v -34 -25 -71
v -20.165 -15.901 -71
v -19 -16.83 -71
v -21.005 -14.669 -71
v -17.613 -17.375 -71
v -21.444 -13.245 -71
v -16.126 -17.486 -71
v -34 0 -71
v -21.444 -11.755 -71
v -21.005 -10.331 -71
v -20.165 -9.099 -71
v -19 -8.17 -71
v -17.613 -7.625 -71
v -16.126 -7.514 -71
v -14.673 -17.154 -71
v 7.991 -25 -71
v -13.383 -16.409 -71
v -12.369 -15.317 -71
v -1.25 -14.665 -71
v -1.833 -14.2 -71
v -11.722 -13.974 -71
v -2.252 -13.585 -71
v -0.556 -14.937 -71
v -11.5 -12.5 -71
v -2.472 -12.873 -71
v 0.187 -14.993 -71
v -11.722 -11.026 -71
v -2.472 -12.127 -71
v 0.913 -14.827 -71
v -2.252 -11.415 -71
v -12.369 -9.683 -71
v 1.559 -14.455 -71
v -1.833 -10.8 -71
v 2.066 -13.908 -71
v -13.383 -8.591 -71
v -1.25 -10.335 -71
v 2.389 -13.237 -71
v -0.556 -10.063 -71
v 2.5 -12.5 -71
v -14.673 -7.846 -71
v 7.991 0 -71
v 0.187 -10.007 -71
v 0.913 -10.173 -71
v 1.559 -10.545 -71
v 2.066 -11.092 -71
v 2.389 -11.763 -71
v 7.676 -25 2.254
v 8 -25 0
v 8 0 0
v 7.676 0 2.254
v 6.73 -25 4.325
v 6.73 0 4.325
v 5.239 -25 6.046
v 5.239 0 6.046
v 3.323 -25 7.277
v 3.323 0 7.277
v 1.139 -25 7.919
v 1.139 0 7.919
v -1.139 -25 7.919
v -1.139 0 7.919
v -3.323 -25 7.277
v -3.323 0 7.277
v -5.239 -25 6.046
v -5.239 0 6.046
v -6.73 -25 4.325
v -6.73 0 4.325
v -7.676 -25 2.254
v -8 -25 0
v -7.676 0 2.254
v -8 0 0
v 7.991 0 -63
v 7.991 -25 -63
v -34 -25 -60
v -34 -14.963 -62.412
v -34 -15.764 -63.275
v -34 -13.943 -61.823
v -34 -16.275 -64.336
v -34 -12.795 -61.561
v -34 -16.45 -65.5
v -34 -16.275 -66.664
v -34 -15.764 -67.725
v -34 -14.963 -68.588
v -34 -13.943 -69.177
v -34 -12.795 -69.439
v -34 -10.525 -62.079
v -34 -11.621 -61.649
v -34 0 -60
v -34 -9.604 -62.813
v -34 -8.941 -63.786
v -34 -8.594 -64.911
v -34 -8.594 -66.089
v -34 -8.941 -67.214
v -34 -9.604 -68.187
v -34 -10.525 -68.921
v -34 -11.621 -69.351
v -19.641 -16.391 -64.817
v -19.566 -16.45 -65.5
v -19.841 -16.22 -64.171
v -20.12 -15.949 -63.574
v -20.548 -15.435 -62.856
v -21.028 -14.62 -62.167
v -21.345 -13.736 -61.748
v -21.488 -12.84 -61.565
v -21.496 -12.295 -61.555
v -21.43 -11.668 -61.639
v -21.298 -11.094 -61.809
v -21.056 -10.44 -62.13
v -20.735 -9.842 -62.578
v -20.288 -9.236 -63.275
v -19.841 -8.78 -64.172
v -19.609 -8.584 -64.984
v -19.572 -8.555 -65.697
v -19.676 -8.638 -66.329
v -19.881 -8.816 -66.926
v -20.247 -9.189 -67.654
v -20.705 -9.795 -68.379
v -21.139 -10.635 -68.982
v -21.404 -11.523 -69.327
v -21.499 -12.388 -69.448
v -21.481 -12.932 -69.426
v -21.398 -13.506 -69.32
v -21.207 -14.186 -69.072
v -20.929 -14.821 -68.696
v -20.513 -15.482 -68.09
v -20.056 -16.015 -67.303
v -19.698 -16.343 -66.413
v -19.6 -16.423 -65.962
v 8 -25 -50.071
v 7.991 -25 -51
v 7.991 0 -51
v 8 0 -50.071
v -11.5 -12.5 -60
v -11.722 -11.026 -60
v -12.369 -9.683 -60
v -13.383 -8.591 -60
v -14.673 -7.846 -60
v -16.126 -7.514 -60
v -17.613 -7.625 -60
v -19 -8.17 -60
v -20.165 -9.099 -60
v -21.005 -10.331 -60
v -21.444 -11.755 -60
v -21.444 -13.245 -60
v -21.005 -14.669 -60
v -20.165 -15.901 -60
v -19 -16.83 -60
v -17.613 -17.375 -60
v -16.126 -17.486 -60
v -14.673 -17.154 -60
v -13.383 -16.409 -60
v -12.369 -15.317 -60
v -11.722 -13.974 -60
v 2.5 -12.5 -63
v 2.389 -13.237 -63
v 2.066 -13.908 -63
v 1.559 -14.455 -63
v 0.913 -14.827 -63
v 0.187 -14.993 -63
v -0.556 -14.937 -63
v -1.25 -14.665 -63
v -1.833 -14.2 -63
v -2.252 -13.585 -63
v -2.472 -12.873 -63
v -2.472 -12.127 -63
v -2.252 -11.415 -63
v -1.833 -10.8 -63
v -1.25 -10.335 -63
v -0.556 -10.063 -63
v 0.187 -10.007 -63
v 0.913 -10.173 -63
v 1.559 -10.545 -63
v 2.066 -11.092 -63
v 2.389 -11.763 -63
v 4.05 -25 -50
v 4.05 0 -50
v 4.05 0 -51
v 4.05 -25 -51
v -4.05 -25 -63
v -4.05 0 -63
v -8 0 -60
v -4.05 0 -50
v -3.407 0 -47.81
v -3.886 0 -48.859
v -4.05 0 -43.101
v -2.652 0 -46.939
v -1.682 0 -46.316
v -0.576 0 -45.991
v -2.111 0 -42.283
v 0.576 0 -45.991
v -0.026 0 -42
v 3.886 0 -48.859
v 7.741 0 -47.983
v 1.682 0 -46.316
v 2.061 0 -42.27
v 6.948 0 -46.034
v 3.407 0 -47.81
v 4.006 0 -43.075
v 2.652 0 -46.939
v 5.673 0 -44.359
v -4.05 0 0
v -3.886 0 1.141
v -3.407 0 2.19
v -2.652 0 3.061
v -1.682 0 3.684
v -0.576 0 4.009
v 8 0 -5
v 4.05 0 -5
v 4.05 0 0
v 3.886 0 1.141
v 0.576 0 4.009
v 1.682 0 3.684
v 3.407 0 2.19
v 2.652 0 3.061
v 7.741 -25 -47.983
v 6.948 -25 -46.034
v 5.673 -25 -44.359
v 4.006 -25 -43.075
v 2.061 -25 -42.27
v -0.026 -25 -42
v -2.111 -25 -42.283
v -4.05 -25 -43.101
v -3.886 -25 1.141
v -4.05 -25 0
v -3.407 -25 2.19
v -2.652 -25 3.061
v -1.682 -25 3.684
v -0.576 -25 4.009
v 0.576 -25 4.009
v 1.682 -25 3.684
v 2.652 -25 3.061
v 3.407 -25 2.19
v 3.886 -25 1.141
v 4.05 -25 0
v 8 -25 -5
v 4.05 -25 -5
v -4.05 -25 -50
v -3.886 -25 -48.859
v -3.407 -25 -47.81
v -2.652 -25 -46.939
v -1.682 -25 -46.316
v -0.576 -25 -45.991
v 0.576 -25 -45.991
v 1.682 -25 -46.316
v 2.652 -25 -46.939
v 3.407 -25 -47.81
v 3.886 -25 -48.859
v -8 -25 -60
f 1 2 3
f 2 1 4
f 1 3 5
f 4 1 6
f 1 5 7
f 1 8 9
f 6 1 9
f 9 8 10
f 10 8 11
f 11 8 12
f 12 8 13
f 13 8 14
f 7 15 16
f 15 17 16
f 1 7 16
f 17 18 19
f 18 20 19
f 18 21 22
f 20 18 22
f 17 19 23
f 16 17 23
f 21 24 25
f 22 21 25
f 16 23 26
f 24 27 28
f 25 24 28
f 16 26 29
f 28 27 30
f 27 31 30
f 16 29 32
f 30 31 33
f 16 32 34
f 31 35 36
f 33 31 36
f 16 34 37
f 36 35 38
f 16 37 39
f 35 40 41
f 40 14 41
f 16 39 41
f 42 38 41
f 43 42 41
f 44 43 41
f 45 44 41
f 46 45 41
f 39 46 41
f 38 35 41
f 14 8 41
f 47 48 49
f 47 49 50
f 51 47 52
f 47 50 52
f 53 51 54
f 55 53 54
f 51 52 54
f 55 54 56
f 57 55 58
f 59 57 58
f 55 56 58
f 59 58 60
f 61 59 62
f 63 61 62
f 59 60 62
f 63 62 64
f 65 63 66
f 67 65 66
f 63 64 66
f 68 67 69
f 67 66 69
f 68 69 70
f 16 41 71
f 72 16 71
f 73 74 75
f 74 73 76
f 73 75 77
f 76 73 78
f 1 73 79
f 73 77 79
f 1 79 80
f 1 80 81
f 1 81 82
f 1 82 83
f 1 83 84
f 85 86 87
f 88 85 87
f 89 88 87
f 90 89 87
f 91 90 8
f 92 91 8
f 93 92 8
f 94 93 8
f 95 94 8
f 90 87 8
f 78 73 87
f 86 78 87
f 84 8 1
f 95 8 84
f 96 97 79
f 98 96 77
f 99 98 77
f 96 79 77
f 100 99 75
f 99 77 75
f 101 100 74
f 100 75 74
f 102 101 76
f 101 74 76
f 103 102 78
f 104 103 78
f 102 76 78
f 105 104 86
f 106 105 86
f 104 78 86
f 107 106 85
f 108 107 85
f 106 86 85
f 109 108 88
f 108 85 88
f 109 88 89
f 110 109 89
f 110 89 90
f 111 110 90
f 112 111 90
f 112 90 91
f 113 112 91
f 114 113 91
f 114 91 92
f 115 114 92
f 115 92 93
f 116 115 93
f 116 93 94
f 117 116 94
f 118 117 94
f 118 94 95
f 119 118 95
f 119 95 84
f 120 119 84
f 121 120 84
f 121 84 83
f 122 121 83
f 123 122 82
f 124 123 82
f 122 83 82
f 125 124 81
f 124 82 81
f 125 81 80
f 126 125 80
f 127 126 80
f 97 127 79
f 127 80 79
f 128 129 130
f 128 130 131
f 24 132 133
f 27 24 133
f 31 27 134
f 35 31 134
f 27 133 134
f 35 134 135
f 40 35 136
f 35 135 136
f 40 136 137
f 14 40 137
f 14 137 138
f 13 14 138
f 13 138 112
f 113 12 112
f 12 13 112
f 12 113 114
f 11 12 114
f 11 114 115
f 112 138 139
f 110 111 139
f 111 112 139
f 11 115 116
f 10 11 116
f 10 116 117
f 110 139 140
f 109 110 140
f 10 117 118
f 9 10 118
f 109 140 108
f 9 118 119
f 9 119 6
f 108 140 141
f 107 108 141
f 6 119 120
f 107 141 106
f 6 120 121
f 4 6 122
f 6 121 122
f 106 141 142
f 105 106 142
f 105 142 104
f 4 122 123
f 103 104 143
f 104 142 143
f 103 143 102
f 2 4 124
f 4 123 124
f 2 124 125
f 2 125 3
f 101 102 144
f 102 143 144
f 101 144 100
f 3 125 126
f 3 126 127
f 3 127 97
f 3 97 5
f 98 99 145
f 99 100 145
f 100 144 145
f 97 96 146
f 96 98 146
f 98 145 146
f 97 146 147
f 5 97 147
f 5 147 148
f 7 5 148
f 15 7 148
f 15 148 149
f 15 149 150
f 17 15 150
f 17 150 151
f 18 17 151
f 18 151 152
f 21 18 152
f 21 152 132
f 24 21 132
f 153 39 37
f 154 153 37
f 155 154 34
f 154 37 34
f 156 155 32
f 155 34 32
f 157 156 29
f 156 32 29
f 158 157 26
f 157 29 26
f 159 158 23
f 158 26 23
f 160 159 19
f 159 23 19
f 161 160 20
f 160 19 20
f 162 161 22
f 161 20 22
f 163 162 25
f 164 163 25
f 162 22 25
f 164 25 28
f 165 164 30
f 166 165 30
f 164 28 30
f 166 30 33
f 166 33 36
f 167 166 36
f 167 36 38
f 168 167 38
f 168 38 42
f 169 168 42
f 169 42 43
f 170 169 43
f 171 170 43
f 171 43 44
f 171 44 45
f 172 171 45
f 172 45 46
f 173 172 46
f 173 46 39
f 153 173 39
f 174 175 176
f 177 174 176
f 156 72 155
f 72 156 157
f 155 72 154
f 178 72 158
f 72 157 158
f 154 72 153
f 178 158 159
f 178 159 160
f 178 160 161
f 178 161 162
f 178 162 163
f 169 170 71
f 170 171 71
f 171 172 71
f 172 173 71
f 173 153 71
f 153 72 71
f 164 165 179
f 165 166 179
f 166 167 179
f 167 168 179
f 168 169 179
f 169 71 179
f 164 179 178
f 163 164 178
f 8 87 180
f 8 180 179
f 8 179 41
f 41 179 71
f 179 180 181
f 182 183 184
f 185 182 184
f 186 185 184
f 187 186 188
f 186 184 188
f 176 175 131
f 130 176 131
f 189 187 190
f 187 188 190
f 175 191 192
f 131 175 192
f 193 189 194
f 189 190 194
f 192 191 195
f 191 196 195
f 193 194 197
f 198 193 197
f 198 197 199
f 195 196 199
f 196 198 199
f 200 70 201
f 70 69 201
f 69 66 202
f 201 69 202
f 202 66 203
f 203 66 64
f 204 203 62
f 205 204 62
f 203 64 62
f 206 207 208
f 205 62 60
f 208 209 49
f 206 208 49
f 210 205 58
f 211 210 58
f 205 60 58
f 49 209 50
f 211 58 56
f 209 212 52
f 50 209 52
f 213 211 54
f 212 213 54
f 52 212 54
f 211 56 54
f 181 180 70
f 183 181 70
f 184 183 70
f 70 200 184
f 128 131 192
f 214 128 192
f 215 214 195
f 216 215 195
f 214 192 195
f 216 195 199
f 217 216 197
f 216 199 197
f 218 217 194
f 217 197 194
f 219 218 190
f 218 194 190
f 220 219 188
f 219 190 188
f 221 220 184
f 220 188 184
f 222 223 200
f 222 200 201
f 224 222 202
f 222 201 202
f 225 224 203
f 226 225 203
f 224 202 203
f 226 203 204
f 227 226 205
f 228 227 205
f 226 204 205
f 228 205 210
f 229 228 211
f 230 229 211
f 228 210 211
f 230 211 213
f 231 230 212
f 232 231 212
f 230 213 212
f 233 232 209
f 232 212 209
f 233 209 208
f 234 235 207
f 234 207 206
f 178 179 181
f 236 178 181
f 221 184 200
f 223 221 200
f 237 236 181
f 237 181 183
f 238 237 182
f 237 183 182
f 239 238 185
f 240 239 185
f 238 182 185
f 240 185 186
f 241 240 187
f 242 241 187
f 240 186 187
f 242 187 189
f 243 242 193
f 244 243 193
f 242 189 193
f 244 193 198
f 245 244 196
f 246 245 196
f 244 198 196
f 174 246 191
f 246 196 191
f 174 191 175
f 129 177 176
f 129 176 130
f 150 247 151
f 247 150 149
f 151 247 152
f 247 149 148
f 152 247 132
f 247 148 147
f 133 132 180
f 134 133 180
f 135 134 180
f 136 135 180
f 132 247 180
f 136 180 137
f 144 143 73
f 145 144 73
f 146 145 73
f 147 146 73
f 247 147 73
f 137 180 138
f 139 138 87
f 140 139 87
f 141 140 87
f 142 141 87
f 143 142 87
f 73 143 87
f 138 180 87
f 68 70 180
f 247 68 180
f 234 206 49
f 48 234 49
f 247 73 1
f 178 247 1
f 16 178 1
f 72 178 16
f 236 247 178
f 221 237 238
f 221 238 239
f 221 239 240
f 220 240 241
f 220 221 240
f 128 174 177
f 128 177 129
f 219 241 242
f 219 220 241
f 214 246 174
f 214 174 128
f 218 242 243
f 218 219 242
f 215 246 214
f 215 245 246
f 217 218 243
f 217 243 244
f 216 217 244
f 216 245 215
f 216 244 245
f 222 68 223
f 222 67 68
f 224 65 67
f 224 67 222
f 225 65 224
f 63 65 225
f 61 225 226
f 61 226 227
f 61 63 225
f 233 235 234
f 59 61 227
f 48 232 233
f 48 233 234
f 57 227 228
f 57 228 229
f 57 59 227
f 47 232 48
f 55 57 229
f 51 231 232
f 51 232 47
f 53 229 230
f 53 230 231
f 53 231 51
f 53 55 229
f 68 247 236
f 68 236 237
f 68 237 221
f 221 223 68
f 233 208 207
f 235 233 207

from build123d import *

# Parameters (mm, degrees)
F1_DEPTH = 25
F2_R     = 5
F3_DEPTH = 25
F4_R     = 2.5
F5_DEPTH = 15
F6_R     = 3.95
F7_DEPTH = 17


with BuildPart() as f1:
    # F0 (on Front) → F1 (new body)
    with BuildSketch(Plane.XZ):
        with BuildLine():
            ThreePointArc((-4.05, 0), (0, 4.05), (4.05, 0))
            Line((4.05, 0), (4.05, -5))
            Line((4.05, -5), (8, -5))
            Line((8, -5), (8, 0))
            ThreePointArc((8, 0), (0, 8), (-8, 0))
            Line((-8, 0), (-8, -50))
            Line((-8, -50), (-8, -60))
            Line((-8, -60), (-34, -60))
            Line((-34, -60), (-34, -71))
            Line((-34, -71), (-4.05, -71))
            Line((-4.05, -71), (7.991412, -71))
            Line((7.991412, -71), (7.991412, -63))
            Line((7.991412, -63), (-4.05, -63))
            Line((-4.05, -63), (-4.05, -50))
            ThreePointArc((-4.05, -50), (0, -45.95), (4.05, -50))
            Line((4.05, -50), (4.05, -51))
            Line((4.05, -51), (7.991412, -51))
            Line((7.991412, -51), (7.999683, -50.071239))
            ThreePointArc((7.999683, -50.071239), (4.005794, -43.075145), (-4.05, -43.100906))
            Line((-4.05, -43.100906), (-4.05, 0))
        make_face()
    extrude(amount=F1_DEPTH)

    # F2 (on face) → F3 (cut)
    with BuildSketch(Plane.XY.offset(-60)):
        with Locations((-16.5, -12.5)):
            Circle(F2_R)
    extrude(amount=-F3_DEPTH, mode=Mode.SUBTRACT)

    # F4 (on face) → F5 (cut)
    with BuildSketch(Plane(origin=(0, 0, -71), x_dir=(1, 0, 0), z_dir=(0, 0, -1))):
        with Locations((0, 12.5)):
            Circle(F4_R)
    extrude(amount=-F5_DEPTH, mode=Mode.SUBTRACT)

    # F6 (on face) → F7 (cut)
    with BuildSketch(Plane(origin=(-34, 0, 0), x_dir=(0, -1, 0), z_dir=(-1, 0, 0))):
        with Locations((12.5, -65.5)):
            Circle(F6_R)
    extrude(amount=-F7_DEPTH, mode=Mode.SUBTRACT)


solid = f1.part
